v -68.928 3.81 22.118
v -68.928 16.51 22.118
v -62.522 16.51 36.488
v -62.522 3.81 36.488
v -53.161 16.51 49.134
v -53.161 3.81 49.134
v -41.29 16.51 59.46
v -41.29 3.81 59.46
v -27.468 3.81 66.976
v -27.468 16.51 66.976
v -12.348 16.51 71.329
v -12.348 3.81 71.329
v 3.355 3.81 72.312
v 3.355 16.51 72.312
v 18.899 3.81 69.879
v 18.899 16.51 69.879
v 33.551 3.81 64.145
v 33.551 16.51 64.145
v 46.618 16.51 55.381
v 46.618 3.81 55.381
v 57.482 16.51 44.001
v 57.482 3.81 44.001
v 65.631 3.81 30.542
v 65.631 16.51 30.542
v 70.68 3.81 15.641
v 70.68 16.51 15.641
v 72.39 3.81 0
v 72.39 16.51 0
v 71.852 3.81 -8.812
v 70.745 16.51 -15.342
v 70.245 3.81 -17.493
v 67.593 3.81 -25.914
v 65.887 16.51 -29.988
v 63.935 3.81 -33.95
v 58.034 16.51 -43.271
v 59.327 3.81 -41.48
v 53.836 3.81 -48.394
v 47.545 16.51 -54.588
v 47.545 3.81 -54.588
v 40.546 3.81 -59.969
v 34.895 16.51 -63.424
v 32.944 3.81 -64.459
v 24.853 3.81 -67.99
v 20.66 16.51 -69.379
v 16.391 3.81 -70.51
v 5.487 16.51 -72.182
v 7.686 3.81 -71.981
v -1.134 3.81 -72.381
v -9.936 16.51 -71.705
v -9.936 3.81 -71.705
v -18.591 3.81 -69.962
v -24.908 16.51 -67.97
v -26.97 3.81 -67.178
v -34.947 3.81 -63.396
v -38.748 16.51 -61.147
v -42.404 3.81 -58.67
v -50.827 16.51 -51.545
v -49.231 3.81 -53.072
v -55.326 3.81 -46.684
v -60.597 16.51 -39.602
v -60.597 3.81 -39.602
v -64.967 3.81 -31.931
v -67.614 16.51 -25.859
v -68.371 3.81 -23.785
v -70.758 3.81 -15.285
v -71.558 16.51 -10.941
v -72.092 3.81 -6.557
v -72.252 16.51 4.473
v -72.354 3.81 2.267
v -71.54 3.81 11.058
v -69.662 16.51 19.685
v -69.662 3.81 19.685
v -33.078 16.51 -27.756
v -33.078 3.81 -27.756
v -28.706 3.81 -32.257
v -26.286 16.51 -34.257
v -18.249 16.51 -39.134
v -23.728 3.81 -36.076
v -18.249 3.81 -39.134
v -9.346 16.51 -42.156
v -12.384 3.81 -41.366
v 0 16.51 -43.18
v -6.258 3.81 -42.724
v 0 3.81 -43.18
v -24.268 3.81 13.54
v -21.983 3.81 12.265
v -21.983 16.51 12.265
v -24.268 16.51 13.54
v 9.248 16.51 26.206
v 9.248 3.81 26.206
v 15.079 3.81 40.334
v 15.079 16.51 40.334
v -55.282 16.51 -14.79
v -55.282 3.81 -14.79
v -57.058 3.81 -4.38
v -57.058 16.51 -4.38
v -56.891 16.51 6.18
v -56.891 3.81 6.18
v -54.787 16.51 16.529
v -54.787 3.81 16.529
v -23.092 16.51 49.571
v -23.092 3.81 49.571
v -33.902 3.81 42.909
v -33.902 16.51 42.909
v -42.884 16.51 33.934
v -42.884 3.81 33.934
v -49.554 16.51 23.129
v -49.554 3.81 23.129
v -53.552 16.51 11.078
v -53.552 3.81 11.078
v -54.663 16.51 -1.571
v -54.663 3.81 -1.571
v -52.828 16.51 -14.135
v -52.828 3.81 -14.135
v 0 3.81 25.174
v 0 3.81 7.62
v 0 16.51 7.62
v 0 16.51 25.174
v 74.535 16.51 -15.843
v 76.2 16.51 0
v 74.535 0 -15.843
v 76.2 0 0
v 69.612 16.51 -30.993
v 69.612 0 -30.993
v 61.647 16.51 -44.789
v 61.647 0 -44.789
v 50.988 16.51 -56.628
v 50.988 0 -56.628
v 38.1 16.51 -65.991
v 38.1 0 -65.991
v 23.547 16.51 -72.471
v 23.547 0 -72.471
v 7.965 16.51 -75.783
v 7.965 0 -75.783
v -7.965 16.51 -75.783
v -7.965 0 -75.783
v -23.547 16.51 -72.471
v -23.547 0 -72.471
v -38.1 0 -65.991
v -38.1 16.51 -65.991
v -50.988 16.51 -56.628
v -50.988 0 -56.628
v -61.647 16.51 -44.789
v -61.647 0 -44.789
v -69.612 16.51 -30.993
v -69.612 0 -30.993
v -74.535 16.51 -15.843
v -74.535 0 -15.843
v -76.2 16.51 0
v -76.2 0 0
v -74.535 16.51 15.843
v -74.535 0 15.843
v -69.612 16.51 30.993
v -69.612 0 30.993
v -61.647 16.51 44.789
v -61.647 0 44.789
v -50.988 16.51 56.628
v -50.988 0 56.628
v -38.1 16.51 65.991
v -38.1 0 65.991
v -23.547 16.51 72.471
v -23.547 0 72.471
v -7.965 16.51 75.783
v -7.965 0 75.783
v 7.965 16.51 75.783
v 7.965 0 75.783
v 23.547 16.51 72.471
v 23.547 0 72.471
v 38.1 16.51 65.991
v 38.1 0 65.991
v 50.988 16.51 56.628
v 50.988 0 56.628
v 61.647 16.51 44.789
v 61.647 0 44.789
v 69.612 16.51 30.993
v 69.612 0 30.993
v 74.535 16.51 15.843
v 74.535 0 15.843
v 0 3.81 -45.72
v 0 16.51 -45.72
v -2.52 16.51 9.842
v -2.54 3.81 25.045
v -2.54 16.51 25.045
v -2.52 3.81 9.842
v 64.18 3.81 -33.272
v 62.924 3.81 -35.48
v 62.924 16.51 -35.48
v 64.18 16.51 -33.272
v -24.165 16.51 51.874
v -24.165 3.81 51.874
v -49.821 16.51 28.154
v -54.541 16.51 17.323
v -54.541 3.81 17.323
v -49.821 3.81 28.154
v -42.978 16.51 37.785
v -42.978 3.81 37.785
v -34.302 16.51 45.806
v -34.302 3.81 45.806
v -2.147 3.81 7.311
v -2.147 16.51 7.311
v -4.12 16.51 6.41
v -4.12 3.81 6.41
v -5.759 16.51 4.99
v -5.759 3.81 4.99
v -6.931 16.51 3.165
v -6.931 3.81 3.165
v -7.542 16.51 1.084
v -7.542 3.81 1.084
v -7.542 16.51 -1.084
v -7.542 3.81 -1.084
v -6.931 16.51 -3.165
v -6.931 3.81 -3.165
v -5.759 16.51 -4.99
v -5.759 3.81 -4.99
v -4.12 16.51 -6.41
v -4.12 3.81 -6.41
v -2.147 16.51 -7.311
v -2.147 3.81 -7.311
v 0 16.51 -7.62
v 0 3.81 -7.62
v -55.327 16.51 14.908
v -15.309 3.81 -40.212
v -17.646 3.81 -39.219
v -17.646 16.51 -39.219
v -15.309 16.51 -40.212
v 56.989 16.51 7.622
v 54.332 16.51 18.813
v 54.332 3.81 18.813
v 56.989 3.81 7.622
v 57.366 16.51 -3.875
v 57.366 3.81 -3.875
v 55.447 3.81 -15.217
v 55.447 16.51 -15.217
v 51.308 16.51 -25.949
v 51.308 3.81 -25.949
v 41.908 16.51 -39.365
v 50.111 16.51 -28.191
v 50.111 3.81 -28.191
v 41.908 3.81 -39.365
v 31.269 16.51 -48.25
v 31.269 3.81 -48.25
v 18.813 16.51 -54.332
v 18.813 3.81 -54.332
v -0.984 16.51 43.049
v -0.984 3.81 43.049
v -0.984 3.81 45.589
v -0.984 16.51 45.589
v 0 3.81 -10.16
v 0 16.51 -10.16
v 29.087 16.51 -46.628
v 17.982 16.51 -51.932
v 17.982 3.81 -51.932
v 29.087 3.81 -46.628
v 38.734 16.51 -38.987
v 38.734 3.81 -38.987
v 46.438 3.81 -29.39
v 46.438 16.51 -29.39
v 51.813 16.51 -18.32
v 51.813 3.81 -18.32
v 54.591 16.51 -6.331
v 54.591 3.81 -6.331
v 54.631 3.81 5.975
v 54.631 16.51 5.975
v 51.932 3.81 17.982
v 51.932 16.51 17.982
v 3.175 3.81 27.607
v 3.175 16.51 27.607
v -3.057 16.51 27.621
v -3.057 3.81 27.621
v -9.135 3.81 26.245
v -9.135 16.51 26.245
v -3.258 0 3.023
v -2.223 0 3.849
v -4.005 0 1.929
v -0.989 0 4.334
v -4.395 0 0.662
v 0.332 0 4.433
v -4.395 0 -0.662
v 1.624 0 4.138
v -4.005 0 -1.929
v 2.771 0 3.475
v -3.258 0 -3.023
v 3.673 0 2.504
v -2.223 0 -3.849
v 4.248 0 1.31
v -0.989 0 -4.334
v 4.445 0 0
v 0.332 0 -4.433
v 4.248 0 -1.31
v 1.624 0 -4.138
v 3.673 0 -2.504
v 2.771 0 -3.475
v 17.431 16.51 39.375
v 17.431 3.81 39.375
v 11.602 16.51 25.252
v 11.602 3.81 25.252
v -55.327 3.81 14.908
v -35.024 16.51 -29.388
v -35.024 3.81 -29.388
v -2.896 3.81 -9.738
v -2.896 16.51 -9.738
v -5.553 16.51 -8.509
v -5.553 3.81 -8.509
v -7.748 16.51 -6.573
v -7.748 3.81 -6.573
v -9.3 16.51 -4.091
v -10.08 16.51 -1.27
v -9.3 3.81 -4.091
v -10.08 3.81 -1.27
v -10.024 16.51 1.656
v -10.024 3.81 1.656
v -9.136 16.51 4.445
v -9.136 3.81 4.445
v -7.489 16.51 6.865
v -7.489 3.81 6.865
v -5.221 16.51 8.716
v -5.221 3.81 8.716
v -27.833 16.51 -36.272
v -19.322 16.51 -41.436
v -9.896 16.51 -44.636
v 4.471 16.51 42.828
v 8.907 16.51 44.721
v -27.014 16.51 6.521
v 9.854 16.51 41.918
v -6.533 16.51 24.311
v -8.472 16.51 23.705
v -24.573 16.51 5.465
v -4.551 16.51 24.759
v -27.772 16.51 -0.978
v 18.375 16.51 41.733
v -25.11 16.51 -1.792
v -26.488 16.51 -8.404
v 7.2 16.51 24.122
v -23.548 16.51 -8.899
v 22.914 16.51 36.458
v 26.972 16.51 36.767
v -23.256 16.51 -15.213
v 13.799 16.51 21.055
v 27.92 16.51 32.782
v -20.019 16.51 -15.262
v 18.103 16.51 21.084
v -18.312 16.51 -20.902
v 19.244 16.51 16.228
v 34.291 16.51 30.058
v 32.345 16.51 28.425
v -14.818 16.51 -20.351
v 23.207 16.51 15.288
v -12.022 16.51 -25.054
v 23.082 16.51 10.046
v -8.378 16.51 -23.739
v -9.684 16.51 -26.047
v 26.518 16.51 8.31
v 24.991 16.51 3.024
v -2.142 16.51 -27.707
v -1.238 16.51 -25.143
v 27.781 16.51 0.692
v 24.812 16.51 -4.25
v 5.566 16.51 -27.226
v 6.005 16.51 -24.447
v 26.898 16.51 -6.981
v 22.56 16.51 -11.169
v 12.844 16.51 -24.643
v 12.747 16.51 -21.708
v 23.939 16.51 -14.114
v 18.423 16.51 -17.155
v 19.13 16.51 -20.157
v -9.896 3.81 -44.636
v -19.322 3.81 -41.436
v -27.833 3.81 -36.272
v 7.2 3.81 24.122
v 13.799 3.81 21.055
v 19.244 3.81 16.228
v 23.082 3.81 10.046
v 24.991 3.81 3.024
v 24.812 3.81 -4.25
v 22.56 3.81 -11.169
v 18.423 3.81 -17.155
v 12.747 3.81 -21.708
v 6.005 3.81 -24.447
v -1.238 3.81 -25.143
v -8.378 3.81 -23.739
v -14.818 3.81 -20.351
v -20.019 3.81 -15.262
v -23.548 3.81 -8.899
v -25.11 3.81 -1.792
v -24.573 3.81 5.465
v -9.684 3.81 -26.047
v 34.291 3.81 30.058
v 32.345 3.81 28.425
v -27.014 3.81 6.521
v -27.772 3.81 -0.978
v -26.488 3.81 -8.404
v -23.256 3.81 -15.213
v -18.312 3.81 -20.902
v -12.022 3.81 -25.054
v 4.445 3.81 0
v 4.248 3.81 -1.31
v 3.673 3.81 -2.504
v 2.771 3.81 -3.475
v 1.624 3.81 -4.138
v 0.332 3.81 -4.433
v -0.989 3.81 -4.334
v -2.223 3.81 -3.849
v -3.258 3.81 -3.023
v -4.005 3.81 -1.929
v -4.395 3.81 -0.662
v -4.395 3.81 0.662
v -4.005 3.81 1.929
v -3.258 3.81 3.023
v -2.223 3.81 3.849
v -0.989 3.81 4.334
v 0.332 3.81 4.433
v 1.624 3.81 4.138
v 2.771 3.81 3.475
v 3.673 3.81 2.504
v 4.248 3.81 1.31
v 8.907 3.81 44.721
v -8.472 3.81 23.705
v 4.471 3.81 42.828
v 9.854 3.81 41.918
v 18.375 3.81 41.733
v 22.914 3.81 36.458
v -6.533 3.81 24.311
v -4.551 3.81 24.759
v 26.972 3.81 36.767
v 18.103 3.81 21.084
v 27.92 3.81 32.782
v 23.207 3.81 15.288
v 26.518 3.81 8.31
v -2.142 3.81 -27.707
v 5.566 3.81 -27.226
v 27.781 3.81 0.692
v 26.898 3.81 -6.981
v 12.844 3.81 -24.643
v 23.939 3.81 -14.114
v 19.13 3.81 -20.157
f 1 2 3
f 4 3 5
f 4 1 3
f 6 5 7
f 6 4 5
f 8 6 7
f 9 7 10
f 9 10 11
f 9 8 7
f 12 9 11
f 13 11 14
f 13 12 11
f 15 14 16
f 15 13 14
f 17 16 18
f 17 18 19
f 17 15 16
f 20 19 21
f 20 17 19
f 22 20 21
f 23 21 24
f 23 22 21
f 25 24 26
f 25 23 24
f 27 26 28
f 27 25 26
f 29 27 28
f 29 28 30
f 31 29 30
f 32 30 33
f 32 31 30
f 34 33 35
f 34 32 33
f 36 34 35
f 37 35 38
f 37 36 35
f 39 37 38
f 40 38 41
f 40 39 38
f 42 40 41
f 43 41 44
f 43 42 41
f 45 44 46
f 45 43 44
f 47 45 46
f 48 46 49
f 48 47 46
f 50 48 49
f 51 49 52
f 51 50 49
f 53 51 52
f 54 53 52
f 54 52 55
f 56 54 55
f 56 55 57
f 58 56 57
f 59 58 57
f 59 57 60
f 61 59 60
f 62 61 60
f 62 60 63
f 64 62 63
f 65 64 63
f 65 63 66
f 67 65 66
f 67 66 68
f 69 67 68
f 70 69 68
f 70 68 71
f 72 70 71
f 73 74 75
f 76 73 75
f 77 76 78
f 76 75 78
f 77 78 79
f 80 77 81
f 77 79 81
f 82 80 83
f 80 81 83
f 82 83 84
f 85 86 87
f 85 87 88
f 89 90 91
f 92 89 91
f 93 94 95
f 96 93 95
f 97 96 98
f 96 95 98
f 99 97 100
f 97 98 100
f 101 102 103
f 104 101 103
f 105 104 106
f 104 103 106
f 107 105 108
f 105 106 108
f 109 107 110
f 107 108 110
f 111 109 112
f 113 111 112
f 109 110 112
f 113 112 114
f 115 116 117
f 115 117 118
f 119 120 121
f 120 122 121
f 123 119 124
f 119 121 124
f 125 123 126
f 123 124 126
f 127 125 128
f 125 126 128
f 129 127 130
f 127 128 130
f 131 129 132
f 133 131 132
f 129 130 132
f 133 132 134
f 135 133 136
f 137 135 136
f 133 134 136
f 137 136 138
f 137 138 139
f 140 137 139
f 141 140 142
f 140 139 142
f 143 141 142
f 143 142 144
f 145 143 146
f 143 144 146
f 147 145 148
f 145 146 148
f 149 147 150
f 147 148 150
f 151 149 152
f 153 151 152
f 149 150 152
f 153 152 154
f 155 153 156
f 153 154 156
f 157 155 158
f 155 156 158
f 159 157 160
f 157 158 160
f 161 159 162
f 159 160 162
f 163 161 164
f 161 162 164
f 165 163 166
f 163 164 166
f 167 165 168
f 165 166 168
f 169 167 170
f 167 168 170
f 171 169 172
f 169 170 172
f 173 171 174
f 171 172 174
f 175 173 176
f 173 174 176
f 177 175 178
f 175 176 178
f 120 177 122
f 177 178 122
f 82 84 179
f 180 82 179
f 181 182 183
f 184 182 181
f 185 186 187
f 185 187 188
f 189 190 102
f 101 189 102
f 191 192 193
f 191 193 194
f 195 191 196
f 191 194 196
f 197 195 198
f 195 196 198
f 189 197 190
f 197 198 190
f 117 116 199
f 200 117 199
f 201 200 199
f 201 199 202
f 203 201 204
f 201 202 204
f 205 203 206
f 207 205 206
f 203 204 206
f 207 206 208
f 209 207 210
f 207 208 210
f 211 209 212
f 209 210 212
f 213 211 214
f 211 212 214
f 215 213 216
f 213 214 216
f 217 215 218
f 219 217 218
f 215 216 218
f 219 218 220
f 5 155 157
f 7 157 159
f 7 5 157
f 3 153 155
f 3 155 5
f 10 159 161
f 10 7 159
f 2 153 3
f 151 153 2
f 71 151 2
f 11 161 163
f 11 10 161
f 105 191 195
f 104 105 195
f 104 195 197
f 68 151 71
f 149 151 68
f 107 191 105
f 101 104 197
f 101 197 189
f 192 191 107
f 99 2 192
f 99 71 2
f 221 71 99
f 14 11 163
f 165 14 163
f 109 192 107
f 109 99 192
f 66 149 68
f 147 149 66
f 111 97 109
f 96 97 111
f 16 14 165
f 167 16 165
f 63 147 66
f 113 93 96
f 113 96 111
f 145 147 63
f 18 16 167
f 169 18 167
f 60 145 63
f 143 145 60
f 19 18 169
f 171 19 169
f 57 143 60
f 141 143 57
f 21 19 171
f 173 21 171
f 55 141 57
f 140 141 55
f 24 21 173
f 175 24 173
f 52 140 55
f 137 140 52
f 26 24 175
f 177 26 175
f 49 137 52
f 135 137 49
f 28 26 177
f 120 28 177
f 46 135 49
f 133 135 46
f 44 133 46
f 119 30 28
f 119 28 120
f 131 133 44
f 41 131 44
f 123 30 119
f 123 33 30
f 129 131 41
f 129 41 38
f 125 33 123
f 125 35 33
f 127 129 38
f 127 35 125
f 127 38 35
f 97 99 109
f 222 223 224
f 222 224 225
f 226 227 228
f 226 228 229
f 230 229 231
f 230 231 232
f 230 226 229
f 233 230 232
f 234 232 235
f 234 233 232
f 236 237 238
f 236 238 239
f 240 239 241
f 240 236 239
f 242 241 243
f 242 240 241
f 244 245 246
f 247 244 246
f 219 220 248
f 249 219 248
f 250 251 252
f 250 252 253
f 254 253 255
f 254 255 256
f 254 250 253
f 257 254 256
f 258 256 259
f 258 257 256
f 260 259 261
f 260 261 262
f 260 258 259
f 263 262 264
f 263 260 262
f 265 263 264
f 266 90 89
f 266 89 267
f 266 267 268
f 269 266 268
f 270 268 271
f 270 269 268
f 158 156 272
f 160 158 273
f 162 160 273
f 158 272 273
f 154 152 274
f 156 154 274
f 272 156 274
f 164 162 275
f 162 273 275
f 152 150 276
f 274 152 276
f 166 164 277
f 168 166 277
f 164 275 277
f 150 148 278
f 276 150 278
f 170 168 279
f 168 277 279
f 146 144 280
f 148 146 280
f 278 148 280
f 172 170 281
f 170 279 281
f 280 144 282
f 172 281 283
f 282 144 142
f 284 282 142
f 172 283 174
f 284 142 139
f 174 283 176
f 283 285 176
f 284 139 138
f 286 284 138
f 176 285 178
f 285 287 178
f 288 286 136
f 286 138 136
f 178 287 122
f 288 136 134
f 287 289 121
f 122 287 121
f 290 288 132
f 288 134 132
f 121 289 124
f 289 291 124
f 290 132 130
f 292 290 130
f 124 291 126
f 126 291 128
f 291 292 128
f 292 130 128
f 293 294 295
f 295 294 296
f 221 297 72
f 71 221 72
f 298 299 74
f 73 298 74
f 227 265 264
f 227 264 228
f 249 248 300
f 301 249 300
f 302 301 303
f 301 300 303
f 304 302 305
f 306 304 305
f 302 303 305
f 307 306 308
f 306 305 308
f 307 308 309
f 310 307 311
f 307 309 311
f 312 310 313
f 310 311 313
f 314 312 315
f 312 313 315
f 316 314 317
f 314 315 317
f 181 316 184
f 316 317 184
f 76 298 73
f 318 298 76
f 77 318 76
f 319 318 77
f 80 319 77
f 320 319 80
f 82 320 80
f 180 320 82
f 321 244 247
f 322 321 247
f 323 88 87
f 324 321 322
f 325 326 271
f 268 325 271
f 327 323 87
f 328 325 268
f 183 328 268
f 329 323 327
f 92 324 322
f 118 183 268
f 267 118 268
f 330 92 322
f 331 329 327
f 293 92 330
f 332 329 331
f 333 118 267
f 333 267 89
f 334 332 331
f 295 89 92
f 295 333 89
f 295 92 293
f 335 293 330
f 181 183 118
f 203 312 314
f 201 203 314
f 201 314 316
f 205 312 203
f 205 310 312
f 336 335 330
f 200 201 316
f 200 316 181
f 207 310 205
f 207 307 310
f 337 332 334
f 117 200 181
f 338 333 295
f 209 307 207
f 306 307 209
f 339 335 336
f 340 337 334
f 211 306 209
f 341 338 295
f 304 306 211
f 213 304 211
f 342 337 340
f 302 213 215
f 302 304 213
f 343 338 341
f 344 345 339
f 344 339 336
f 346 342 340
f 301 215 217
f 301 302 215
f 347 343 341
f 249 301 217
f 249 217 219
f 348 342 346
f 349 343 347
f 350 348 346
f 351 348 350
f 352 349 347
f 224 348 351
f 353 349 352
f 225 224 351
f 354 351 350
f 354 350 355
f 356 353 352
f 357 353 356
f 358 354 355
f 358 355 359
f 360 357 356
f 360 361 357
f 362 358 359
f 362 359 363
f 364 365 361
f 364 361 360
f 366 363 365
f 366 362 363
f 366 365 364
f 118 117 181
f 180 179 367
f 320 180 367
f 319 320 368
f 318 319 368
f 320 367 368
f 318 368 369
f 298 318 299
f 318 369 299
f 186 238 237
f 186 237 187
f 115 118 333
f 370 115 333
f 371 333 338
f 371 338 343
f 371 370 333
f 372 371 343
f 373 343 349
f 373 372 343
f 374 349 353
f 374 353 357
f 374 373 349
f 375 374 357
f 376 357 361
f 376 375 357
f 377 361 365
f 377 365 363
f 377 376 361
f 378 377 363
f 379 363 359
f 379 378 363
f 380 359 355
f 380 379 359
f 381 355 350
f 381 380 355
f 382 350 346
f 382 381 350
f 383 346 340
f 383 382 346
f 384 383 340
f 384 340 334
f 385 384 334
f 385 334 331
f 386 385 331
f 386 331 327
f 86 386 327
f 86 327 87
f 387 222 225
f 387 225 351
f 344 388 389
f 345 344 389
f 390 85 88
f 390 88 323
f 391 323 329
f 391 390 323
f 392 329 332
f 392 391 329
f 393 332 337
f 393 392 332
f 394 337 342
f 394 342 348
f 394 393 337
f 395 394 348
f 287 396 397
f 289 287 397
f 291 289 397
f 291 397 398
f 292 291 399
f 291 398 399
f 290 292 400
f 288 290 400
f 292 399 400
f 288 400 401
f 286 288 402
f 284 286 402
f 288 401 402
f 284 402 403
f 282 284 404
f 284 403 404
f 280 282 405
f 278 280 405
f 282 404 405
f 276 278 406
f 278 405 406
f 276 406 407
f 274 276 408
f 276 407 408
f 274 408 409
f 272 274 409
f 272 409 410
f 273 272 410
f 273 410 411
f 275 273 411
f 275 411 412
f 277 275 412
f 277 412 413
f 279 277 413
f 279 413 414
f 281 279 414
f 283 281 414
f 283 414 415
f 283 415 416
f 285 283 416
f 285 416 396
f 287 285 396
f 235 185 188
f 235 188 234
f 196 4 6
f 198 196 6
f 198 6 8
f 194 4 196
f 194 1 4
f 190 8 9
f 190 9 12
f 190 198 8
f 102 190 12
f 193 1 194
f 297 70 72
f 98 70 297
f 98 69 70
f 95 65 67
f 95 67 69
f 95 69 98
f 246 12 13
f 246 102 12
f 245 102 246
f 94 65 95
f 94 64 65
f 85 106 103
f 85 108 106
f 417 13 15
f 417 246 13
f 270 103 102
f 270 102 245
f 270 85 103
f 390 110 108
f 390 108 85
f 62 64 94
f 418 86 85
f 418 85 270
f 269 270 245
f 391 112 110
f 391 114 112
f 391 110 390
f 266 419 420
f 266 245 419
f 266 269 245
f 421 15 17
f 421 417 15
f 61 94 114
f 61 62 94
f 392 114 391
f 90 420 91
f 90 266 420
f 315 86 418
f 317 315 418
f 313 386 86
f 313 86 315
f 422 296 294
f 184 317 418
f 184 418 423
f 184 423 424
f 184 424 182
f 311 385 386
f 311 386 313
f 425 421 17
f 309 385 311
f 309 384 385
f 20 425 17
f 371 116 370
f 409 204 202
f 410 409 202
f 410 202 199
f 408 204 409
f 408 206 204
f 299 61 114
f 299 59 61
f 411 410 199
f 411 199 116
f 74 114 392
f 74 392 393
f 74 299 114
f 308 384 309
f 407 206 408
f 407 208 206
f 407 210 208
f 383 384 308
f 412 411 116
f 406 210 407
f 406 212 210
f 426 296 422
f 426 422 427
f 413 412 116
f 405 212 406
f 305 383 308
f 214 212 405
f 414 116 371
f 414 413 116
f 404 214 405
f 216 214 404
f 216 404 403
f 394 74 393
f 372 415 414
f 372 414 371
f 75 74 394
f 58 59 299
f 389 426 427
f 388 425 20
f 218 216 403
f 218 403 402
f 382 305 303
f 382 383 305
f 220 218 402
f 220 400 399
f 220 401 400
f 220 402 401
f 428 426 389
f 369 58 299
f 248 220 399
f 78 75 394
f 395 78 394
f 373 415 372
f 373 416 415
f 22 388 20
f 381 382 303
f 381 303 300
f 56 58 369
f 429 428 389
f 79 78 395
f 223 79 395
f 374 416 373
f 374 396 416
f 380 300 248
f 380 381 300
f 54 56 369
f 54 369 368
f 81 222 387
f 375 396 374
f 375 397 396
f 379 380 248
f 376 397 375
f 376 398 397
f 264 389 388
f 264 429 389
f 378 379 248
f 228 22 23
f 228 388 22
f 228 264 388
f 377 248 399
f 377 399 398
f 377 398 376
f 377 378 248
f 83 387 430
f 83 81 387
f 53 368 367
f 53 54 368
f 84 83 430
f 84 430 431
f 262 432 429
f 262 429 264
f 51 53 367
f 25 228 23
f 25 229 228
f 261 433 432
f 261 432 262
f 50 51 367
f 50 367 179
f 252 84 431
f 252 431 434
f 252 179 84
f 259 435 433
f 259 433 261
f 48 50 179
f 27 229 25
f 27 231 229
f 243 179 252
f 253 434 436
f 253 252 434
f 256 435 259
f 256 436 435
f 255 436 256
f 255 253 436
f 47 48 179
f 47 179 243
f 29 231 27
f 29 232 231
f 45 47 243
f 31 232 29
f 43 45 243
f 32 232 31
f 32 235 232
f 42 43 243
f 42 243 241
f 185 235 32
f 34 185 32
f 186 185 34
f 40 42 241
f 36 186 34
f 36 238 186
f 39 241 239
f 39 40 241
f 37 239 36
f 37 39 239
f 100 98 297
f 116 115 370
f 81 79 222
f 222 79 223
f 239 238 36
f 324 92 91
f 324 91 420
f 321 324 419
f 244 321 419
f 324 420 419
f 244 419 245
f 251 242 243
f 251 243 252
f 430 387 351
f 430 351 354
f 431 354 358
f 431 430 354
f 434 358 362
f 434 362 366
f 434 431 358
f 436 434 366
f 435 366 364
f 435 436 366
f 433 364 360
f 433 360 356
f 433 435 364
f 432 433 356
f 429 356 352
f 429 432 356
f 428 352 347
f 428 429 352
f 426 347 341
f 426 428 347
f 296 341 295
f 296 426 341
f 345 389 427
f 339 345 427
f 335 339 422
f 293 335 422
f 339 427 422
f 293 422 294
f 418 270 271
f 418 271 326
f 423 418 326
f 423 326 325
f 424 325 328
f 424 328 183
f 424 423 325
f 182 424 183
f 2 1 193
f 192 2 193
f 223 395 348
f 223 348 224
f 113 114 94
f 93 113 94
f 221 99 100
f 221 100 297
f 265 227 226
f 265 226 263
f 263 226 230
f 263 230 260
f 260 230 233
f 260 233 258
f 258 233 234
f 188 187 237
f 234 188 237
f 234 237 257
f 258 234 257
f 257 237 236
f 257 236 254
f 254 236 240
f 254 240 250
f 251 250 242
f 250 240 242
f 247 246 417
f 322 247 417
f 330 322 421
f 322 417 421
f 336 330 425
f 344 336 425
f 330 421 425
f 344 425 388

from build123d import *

# Parameters (mm, degrees)
SKETCH1_R            = 76.2
BOSS_EXTRUDE1_DEPTH  = 3.81
SKETCH2_R            = 76.2
SKETCH2_R_2          = 72.39
BOSS_EXTRUDE2_DEPTH  = 12.7
SKETCH3_R            = 4.445
CUT_EXTRUDE1_DEPTH   = 4.81
BOSS_EXTRUDE3_DEPTH  = 12.7
BOSS_EXTRUDE4_DEPTH  = 12.7
BOSS_EXTRUDE5_DEPTH  = 12.7
BOSS_EXTRUDE8_DEPTH  = 12.7
BOSS_EXTRUDE9_DEPTH  = 12.7
BOSS_EXTRUDE10_DEPTH = 12.7
BOSS_EXTRUDE11_DEPTH = 12.7
BOSS_EXTRUDE19_DEPTH = 12.7
BOSS_EXTRUDE20_DEPTH = 12.7
BOSS_EXTRUDE21_DEPTH = 12.7
BOSS_EXTRUDE22_DEPTH = 12.7


with BuildPart() as part:
    # Sketch1 → Boss-Extrude1 (new body)
    with BuildSketch(Plane(origin=(0, 0, 0), x_dir=(1, 0, 0), z_dir=(0, 1, 0))):
        Circle(SKETCH1_R)
    extrude(amount=BOSS_EXTRUDE1_DEPTH)

    # Sketch2 → Boss-Extrude2 (add)
    with BuildSketch(Plane(origin=(0, 3.81, 0), x_dir=(1, 0, 0), z_dir=(0, 1, 0))):
        Circle(SKETCH2_R)
        Circle(SKETCH2_R_2, mode=Mode.SUBTRACT)
    extrude(amount=BOSS_EXTRUDE2_DEPTH)

    # Sketch3 → Cut-Extrude1 (cut, through all)
    with BuildSketch(Plane(origin=(0, 3.81, 0), x_dir=(1, 0, 0), z_dir=(0, 1, 0))):
        Circle(SKETCH3_R)
    extrude(amount=-CUT_EXTRUDE1_DEPTH, mode=Mode.SUBTRACT)

    # Sketch4 → Boss-Extrude3 (add)
    with BuildSketch(Plane(origin=(0, 3.81, 0), x_dir=(1, 0, 0), z_dir=(0, 1, 0))):
        with BuildLine():
            Line((0, 7.62), (0, 10.16))
            ThreePointArc((0, 10.16), (-10.16, 0), (0, -10.16))
            Line((0, -10.16), (0, -7.62))
            ThreePointArc((0, -7.62), (-7.62, 0), (0, 7.62))
        make_face()
    extrude(amount=BOSS_EXTRUDE3_DEPTH)

    # Sketch5 → Boss-Extrude4 (add)
    with BuildSketch(Plane(origin=(0, 3.81, 0), x_dir=(1, 0, 0), z_dir=(0, 1, 0))):
        Polygon((0, -10.16), (0, -25.176651115), (-2.54, -25.176651115), (-2.520078124, -9.8425), align=None)
    extrude(amount=BOSS_EXTRUDE4_DEPTH)

    # Sketch6 → Boss-Extrude5 (add)
    with BuildSketch(Plane(origin=(0, 3.81, 0), x_dir=(1, 0, 0), z_dir=(0, 1, 0))):
        with BuildLine():
            Line((-21.983467268, -12.265166189), (-24.2679054, -13.539715513))
            ThreePointArc((-24.2679054, -13.539715513), (17.868925405, 21.282777862), (-9.135212339, -26.245057138))
            Line((-9.135212339, -26.245057138), (-8.472154438, -23.705057138))
            ThreePointArc((-8.472154438, -23.705057138), (16.266652993, 19.212057025), (-21.983467268, -12.265166189))
        make_face()
    extrude(amount=BOSS_EXTRUDE5_DEPTH)

    # Sketch7 → Boss-Extrude8 (add)
    with BuildSketch(Plane(origin=(0, 3.81, 0), x_dir=(1, 0, 0), z_dir=(0, 1, 0))):
        Polygon((9.247520886, -26.205695681), (15.12853456, -40.45434823), (17.476408475, -39.485282661), (11.601678734, -25.251854966), align=None)
    extrude(amount=BOSS_EXTRUDE8_DEPTH)

    # Sketch8 → Boss-Extrude9 (add)
    with BuildSketch(Plane(origin=(0, 3.81, 0), x_dir=(1, 0, 0), z_dir=(0, 1, 0))):
        with BuildLine():
            Line((-0.983739015, -43.049055689), (-0.983739015, -45.589055689))
            ThreePointArc((-0.983739015, -45.589055689), (18.37519714, -41.733462247), (34.290907527, -30.05766794))
            Line((34.290907527, -30.05766794), (32.345154642, -28.424987411))
            ThreePointArc((32.345154642, -28.424987411), (17.301746755, -39.431440468), (-0.983739015, -43.049055689))
        make_face()
    extrude(amount=BOSS_EXTRUDE9_DEPTH)

    # Sketch9 → Boss-Extrude10 (add)
    with BuildSketch(Plane(origin=(0, 3.81, 0), x_dir=(1, 0, 0), z_dir=(0, 1, 0))):
        Polygon((-9.684496714, 26.047373228), (-12.022324897, 25.054317646), (-17.646368783, 39.218629503), (-15.3085406, 40.211685084), align=None)
    extrude(amount=BOSS_EXTRUDE10_DEPTH)

    # Sketch10 → Boss-Extrude11 (add)
    with BuildSketch(Plane(origin=(0, 3.81, 0), x_dir=(1, 0, 0), z_dir=(0, 1, 0))):
        with BuildLine():
            Line((0, 43.18), (0, 45.72))
            ThreePointArc((0, 45.72), (-19.322106927, 41.436392023), (-35.023551939, 29.388249515))
            Line((-35.023551939, 29.388249515), (-33.077799054, 27.755568986))
            ThreePointArc((-33.077799054, 27.755568986), (-18.248656542, 39.134370244), (0, 43.18))
        make_face()
    extrude(amount=BOSS_EXTRUDE11_DEPTH)

    # Sketch15 → Boss-Extrude19 (add)
    with BuildSketch(Plane(origin=(0, 16.51, 0), x_dir=(1, 0, 0), z_dir=(0, 1, 0))):
        with BuildLine():
            Line((18.813236265, 54.331808343), (17.982135906, 51.931626642))
            ThreePointArc((17.982135906, 51.931626642), (49.436495597, 24.005915117), (51.931626642, -17.982135906))
            Line((51.931626642, -17.982135906), (54.331808343, -18.813236265))
            ThreePointArc((54.331808343, -18.813236265), (51.721357052, 25.115423174), (18.813236265, 54.331808343))
        make_face()
    extrude(amount=-BOSS_EXTRUDE19_DEPTH)

    # Sketch16 → Boss-Extrude20 (add)
    with BuildSketch(Plane(origin=(0, 3.81, 0), x_dir=(1, 0, 0), z_dir=(0, 1, 0))):
        Polygon((62.923710936, 35.479950277), (64.179700672, 33.272216194), (50.933296173, 25.736277775), (49.677306437, 27.944011858), align=None)
    extrude(amount=BOSS_EXTRUDE20_DEPTH)

    # Sketch17 → Boss-Extrude21 (add)
    with BuildSketch(Plane(origin=(0, 3.81, 0), x_dir=(1, 0, 0), z_dir=(0, 1, 0))):
        Polygon((-69.78543957, -19.725953422), (-68.982438616, -22.135681513), (-54.524070075, -17.317675793), (-55.327071028, -14.907947702), align=None)
    extrude(amount=BOSS_EXTRUDE21_DEPTH)

    # Sketch18 → Boss-Extrude22 (add)
    with BuildSketch(Plane(origin=(0, 3.81, 0), x_dir=(1, 0, 0), z_dir=(0, 1, 0))):
        with BuildLine():
            Line((-24.16501099, -51.873510961), (-23.092435835, -49.571081258))
            ThreePointArc((-23.092435835, -49.571081258), (-49.553841631, -23.129407029), (-52.827537989, 14.135201447))
            Line((-52.827537989, 14.135201447), (-55.281645892, 14.790149527))
            ThreePointArc((-55.281645892, 14.790149527), (-51.855122504, -24.204445165), (-24.16501099, -51.873510961))
        make_face()
    extrude(amount=BOSS_EXTRUDE22_DEPTH)


solid = part.part
